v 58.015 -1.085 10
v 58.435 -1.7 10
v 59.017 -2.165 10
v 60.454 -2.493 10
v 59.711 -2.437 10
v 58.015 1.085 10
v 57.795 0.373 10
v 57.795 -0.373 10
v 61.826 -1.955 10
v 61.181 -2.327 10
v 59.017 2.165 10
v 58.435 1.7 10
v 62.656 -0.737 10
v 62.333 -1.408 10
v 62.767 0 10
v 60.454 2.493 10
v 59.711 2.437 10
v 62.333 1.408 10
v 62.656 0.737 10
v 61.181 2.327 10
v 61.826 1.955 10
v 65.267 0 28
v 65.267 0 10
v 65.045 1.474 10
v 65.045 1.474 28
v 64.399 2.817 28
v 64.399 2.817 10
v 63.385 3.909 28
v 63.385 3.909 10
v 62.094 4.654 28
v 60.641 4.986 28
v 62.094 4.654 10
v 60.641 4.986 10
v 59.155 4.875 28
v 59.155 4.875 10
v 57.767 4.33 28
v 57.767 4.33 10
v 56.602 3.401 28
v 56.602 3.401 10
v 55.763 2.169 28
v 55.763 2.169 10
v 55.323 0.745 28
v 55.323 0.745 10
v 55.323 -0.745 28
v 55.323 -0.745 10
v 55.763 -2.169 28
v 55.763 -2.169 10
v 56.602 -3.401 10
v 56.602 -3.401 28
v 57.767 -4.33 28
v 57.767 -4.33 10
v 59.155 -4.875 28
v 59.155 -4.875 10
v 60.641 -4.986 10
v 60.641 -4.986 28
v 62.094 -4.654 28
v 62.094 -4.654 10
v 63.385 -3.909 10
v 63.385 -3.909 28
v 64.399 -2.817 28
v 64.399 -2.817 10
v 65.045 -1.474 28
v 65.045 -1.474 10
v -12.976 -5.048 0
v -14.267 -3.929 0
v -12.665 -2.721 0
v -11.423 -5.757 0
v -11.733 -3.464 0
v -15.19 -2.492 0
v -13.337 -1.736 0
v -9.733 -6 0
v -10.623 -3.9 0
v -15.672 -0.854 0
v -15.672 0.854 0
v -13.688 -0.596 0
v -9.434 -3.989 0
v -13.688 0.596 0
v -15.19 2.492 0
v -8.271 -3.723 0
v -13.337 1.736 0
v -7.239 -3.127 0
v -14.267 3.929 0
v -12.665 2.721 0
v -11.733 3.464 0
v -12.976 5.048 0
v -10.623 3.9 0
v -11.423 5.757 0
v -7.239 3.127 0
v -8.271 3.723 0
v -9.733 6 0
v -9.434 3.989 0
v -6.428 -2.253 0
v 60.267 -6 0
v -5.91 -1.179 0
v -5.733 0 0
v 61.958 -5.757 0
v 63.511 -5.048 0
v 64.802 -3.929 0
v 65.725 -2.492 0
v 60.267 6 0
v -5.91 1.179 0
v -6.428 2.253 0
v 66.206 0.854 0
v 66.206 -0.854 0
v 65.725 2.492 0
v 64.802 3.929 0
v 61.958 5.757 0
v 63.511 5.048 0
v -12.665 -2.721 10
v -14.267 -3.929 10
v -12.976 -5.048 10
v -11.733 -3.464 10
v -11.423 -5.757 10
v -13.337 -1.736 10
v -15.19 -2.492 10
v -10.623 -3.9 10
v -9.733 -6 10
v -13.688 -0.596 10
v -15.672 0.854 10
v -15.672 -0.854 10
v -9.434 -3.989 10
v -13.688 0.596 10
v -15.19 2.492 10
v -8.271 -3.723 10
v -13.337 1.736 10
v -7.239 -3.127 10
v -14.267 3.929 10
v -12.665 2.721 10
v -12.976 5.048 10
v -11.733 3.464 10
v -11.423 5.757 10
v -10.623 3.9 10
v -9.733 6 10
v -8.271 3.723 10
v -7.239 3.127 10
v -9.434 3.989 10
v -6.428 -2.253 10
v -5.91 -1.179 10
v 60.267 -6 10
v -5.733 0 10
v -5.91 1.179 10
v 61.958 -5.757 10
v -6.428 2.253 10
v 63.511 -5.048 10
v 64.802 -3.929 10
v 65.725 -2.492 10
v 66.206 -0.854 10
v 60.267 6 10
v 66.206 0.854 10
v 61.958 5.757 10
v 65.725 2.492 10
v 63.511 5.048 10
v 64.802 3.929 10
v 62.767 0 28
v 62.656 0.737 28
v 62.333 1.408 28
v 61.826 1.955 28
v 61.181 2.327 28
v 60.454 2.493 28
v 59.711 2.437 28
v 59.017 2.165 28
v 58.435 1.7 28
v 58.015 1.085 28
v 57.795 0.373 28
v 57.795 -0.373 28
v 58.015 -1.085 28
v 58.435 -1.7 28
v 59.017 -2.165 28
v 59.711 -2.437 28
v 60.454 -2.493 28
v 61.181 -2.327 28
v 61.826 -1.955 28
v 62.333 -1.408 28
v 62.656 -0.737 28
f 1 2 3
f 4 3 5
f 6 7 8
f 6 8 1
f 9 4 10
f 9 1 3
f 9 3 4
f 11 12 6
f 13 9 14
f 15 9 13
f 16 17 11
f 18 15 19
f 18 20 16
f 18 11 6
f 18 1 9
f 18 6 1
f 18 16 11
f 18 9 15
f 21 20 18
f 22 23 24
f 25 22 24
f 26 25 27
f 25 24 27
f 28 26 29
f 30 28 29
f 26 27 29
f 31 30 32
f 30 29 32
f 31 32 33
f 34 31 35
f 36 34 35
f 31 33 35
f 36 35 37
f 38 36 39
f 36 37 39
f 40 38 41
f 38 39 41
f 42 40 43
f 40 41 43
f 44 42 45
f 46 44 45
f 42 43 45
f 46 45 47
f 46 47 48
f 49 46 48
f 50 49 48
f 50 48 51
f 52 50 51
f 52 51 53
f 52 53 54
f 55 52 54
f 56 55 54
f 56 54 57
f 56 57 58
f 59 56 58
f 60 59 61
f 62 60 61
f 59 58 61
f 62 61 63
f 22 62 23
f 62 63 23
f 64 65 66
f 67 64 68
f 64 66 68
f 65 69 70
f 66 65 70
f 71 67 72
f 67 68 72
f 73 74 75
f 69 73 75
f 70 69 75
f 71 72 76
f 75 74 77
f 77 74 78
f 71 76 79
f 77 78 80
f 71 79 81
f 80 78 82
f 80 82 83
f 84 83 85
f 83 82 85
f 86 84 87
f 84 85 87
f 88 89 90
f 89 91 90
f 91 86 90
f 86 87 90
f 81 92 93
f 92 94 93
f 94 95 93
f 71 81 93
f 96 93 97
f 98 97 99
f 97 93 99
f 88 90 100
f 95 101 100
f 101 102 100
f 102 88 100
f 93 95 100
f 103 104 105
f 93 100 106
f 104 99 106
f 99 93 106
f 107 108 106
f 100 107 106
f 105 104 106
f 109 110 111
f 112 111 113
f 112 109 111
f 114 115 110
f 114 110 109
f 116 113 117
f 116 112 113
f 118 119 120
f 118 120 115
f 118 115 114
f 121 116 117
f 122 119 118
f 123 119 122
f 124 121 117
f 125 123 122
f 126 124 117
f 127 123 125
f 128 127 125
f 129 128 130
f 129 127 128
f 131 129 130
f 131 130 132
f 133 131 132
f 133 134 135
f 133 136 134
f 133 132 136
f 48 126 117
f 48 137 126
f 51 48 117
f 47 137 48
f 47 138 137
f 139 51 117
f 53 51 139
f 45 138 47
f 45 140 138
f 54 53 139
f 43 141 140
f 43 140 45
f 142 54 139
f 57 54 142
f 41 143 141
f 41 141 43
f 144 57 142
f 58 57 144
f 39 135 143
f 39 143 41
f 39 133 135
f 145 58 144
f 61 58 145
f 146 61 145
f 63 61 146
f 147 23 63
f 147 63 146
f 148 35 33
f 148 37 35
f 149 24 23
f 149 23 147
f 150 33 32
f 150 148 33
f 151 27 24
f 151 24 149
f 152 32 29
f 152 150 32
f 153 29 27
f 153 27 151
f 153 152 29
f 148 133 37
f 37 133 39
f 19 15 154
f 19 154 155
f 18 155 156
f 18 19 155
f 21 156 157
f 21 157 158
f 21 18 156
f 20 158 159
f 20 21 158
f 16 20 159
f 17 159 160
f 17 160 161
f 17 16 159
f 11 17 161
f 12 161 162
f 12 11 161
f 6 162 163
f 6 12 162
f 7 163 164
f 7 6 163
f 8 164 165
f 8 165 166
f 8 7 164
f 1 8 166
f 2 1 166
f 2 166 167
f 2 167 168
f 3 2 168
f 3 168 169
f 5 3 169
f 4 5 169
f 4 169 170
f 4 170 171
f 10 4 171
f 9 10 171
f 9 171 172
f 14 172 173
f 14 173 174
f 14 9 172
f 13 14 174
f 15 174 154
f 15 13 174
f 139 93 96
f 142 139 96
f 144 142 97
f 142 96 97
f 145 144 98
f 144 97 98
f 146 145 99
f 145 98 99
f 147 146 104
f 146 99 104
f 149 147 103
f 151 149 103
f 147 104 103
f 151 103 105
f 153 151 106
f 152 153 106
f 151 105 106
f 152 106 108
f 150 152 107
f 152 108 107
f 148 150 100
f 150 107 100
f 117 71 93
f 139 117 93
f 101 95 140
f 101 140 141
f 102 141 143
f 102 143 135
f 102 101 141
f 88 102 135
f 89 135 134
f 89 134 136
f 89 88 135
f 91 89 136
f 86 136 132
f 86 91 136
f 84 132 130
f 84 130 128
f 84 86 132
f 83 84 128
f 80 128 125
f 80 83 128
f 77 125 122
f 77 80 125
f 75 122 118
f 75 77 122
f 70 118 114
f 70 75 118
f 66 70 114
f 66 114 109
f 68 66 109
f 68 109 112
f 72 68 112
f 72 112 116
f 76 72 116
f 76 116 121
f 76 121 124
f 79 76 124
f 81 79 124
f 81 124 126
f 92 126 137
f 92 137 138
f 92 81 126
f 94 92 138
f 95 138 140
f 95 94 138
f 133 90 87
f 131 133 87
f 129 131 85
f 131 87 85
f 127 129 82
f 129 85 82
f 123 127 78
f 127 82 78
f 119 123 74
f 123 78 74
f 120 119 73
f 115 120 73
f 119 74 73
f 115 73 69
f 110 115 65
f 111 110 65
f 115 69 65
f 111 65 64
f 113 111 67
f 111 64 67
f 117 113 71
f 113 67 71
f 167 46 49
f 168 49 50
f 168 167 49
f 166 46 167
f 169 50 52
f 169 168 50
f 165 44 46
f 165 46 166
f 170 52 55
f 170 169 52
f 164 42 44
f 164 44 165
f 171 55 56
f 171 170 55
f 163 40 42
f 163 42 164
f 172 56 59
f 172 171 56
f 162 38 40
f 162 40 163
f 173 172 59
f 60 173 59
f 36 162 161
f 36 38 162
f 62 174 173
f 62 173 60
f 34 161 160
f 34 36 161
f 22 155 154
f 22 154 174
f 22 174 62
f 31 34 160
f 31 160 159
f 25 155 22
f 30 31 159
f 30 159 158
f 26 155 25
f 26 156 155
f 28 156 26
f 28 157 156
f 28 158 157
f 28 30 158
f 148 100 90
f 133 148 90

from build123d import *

# Parameters (mm, degrees)
CROQUIS1_R              = 4
SALIENTE_EXTRUIR1_DEPTH = 10
CROQUIS2_R              = 5
CROQUIS2_R_2            = 2.5
SALIENTE_EXTRUIR2_DEPTH = 18


with BuildPart() as part:
    # Croquis1 → Saliente-Extruir1 (new body)
    with BuildSketch(Plane.XY):
        with BuildLine():
            Line((60.267364884, 6), (-9.732635116, 6))
            ThreePointArc((-9.732635116, 6), (-15.732635116, 0), (-9.732635116, -6))
            Line((-9.732635116, -6), (60.267364884, -6))
            ThreePointArc((60.267364884, -6), (66.267364884, 0), (60.267364884, 6))
        make_face()
        with Locations((-9.732635116, 0)):
            Circle(CROQUIS1_R, mode=Mode.SUBTRACT)
    extrude(amount=SALIENTE_EXTRUIR1_DEPTH)

    # Croquis2 → Saliente-Extruir2 (add)
    with BuildSketch(Plane.XY.offset(10)):
        with Locations((60.267364884, 0)):
            Circle(CROQUIS2_R)
        with Locations((60.267364884, 0)):
            Circle(CROQUIS2_R_2, mode=Mode.SUBTRACT)
    extrude(amount=SALIENTE_EXTRUIR2_DEPTH)


solid = part.part
